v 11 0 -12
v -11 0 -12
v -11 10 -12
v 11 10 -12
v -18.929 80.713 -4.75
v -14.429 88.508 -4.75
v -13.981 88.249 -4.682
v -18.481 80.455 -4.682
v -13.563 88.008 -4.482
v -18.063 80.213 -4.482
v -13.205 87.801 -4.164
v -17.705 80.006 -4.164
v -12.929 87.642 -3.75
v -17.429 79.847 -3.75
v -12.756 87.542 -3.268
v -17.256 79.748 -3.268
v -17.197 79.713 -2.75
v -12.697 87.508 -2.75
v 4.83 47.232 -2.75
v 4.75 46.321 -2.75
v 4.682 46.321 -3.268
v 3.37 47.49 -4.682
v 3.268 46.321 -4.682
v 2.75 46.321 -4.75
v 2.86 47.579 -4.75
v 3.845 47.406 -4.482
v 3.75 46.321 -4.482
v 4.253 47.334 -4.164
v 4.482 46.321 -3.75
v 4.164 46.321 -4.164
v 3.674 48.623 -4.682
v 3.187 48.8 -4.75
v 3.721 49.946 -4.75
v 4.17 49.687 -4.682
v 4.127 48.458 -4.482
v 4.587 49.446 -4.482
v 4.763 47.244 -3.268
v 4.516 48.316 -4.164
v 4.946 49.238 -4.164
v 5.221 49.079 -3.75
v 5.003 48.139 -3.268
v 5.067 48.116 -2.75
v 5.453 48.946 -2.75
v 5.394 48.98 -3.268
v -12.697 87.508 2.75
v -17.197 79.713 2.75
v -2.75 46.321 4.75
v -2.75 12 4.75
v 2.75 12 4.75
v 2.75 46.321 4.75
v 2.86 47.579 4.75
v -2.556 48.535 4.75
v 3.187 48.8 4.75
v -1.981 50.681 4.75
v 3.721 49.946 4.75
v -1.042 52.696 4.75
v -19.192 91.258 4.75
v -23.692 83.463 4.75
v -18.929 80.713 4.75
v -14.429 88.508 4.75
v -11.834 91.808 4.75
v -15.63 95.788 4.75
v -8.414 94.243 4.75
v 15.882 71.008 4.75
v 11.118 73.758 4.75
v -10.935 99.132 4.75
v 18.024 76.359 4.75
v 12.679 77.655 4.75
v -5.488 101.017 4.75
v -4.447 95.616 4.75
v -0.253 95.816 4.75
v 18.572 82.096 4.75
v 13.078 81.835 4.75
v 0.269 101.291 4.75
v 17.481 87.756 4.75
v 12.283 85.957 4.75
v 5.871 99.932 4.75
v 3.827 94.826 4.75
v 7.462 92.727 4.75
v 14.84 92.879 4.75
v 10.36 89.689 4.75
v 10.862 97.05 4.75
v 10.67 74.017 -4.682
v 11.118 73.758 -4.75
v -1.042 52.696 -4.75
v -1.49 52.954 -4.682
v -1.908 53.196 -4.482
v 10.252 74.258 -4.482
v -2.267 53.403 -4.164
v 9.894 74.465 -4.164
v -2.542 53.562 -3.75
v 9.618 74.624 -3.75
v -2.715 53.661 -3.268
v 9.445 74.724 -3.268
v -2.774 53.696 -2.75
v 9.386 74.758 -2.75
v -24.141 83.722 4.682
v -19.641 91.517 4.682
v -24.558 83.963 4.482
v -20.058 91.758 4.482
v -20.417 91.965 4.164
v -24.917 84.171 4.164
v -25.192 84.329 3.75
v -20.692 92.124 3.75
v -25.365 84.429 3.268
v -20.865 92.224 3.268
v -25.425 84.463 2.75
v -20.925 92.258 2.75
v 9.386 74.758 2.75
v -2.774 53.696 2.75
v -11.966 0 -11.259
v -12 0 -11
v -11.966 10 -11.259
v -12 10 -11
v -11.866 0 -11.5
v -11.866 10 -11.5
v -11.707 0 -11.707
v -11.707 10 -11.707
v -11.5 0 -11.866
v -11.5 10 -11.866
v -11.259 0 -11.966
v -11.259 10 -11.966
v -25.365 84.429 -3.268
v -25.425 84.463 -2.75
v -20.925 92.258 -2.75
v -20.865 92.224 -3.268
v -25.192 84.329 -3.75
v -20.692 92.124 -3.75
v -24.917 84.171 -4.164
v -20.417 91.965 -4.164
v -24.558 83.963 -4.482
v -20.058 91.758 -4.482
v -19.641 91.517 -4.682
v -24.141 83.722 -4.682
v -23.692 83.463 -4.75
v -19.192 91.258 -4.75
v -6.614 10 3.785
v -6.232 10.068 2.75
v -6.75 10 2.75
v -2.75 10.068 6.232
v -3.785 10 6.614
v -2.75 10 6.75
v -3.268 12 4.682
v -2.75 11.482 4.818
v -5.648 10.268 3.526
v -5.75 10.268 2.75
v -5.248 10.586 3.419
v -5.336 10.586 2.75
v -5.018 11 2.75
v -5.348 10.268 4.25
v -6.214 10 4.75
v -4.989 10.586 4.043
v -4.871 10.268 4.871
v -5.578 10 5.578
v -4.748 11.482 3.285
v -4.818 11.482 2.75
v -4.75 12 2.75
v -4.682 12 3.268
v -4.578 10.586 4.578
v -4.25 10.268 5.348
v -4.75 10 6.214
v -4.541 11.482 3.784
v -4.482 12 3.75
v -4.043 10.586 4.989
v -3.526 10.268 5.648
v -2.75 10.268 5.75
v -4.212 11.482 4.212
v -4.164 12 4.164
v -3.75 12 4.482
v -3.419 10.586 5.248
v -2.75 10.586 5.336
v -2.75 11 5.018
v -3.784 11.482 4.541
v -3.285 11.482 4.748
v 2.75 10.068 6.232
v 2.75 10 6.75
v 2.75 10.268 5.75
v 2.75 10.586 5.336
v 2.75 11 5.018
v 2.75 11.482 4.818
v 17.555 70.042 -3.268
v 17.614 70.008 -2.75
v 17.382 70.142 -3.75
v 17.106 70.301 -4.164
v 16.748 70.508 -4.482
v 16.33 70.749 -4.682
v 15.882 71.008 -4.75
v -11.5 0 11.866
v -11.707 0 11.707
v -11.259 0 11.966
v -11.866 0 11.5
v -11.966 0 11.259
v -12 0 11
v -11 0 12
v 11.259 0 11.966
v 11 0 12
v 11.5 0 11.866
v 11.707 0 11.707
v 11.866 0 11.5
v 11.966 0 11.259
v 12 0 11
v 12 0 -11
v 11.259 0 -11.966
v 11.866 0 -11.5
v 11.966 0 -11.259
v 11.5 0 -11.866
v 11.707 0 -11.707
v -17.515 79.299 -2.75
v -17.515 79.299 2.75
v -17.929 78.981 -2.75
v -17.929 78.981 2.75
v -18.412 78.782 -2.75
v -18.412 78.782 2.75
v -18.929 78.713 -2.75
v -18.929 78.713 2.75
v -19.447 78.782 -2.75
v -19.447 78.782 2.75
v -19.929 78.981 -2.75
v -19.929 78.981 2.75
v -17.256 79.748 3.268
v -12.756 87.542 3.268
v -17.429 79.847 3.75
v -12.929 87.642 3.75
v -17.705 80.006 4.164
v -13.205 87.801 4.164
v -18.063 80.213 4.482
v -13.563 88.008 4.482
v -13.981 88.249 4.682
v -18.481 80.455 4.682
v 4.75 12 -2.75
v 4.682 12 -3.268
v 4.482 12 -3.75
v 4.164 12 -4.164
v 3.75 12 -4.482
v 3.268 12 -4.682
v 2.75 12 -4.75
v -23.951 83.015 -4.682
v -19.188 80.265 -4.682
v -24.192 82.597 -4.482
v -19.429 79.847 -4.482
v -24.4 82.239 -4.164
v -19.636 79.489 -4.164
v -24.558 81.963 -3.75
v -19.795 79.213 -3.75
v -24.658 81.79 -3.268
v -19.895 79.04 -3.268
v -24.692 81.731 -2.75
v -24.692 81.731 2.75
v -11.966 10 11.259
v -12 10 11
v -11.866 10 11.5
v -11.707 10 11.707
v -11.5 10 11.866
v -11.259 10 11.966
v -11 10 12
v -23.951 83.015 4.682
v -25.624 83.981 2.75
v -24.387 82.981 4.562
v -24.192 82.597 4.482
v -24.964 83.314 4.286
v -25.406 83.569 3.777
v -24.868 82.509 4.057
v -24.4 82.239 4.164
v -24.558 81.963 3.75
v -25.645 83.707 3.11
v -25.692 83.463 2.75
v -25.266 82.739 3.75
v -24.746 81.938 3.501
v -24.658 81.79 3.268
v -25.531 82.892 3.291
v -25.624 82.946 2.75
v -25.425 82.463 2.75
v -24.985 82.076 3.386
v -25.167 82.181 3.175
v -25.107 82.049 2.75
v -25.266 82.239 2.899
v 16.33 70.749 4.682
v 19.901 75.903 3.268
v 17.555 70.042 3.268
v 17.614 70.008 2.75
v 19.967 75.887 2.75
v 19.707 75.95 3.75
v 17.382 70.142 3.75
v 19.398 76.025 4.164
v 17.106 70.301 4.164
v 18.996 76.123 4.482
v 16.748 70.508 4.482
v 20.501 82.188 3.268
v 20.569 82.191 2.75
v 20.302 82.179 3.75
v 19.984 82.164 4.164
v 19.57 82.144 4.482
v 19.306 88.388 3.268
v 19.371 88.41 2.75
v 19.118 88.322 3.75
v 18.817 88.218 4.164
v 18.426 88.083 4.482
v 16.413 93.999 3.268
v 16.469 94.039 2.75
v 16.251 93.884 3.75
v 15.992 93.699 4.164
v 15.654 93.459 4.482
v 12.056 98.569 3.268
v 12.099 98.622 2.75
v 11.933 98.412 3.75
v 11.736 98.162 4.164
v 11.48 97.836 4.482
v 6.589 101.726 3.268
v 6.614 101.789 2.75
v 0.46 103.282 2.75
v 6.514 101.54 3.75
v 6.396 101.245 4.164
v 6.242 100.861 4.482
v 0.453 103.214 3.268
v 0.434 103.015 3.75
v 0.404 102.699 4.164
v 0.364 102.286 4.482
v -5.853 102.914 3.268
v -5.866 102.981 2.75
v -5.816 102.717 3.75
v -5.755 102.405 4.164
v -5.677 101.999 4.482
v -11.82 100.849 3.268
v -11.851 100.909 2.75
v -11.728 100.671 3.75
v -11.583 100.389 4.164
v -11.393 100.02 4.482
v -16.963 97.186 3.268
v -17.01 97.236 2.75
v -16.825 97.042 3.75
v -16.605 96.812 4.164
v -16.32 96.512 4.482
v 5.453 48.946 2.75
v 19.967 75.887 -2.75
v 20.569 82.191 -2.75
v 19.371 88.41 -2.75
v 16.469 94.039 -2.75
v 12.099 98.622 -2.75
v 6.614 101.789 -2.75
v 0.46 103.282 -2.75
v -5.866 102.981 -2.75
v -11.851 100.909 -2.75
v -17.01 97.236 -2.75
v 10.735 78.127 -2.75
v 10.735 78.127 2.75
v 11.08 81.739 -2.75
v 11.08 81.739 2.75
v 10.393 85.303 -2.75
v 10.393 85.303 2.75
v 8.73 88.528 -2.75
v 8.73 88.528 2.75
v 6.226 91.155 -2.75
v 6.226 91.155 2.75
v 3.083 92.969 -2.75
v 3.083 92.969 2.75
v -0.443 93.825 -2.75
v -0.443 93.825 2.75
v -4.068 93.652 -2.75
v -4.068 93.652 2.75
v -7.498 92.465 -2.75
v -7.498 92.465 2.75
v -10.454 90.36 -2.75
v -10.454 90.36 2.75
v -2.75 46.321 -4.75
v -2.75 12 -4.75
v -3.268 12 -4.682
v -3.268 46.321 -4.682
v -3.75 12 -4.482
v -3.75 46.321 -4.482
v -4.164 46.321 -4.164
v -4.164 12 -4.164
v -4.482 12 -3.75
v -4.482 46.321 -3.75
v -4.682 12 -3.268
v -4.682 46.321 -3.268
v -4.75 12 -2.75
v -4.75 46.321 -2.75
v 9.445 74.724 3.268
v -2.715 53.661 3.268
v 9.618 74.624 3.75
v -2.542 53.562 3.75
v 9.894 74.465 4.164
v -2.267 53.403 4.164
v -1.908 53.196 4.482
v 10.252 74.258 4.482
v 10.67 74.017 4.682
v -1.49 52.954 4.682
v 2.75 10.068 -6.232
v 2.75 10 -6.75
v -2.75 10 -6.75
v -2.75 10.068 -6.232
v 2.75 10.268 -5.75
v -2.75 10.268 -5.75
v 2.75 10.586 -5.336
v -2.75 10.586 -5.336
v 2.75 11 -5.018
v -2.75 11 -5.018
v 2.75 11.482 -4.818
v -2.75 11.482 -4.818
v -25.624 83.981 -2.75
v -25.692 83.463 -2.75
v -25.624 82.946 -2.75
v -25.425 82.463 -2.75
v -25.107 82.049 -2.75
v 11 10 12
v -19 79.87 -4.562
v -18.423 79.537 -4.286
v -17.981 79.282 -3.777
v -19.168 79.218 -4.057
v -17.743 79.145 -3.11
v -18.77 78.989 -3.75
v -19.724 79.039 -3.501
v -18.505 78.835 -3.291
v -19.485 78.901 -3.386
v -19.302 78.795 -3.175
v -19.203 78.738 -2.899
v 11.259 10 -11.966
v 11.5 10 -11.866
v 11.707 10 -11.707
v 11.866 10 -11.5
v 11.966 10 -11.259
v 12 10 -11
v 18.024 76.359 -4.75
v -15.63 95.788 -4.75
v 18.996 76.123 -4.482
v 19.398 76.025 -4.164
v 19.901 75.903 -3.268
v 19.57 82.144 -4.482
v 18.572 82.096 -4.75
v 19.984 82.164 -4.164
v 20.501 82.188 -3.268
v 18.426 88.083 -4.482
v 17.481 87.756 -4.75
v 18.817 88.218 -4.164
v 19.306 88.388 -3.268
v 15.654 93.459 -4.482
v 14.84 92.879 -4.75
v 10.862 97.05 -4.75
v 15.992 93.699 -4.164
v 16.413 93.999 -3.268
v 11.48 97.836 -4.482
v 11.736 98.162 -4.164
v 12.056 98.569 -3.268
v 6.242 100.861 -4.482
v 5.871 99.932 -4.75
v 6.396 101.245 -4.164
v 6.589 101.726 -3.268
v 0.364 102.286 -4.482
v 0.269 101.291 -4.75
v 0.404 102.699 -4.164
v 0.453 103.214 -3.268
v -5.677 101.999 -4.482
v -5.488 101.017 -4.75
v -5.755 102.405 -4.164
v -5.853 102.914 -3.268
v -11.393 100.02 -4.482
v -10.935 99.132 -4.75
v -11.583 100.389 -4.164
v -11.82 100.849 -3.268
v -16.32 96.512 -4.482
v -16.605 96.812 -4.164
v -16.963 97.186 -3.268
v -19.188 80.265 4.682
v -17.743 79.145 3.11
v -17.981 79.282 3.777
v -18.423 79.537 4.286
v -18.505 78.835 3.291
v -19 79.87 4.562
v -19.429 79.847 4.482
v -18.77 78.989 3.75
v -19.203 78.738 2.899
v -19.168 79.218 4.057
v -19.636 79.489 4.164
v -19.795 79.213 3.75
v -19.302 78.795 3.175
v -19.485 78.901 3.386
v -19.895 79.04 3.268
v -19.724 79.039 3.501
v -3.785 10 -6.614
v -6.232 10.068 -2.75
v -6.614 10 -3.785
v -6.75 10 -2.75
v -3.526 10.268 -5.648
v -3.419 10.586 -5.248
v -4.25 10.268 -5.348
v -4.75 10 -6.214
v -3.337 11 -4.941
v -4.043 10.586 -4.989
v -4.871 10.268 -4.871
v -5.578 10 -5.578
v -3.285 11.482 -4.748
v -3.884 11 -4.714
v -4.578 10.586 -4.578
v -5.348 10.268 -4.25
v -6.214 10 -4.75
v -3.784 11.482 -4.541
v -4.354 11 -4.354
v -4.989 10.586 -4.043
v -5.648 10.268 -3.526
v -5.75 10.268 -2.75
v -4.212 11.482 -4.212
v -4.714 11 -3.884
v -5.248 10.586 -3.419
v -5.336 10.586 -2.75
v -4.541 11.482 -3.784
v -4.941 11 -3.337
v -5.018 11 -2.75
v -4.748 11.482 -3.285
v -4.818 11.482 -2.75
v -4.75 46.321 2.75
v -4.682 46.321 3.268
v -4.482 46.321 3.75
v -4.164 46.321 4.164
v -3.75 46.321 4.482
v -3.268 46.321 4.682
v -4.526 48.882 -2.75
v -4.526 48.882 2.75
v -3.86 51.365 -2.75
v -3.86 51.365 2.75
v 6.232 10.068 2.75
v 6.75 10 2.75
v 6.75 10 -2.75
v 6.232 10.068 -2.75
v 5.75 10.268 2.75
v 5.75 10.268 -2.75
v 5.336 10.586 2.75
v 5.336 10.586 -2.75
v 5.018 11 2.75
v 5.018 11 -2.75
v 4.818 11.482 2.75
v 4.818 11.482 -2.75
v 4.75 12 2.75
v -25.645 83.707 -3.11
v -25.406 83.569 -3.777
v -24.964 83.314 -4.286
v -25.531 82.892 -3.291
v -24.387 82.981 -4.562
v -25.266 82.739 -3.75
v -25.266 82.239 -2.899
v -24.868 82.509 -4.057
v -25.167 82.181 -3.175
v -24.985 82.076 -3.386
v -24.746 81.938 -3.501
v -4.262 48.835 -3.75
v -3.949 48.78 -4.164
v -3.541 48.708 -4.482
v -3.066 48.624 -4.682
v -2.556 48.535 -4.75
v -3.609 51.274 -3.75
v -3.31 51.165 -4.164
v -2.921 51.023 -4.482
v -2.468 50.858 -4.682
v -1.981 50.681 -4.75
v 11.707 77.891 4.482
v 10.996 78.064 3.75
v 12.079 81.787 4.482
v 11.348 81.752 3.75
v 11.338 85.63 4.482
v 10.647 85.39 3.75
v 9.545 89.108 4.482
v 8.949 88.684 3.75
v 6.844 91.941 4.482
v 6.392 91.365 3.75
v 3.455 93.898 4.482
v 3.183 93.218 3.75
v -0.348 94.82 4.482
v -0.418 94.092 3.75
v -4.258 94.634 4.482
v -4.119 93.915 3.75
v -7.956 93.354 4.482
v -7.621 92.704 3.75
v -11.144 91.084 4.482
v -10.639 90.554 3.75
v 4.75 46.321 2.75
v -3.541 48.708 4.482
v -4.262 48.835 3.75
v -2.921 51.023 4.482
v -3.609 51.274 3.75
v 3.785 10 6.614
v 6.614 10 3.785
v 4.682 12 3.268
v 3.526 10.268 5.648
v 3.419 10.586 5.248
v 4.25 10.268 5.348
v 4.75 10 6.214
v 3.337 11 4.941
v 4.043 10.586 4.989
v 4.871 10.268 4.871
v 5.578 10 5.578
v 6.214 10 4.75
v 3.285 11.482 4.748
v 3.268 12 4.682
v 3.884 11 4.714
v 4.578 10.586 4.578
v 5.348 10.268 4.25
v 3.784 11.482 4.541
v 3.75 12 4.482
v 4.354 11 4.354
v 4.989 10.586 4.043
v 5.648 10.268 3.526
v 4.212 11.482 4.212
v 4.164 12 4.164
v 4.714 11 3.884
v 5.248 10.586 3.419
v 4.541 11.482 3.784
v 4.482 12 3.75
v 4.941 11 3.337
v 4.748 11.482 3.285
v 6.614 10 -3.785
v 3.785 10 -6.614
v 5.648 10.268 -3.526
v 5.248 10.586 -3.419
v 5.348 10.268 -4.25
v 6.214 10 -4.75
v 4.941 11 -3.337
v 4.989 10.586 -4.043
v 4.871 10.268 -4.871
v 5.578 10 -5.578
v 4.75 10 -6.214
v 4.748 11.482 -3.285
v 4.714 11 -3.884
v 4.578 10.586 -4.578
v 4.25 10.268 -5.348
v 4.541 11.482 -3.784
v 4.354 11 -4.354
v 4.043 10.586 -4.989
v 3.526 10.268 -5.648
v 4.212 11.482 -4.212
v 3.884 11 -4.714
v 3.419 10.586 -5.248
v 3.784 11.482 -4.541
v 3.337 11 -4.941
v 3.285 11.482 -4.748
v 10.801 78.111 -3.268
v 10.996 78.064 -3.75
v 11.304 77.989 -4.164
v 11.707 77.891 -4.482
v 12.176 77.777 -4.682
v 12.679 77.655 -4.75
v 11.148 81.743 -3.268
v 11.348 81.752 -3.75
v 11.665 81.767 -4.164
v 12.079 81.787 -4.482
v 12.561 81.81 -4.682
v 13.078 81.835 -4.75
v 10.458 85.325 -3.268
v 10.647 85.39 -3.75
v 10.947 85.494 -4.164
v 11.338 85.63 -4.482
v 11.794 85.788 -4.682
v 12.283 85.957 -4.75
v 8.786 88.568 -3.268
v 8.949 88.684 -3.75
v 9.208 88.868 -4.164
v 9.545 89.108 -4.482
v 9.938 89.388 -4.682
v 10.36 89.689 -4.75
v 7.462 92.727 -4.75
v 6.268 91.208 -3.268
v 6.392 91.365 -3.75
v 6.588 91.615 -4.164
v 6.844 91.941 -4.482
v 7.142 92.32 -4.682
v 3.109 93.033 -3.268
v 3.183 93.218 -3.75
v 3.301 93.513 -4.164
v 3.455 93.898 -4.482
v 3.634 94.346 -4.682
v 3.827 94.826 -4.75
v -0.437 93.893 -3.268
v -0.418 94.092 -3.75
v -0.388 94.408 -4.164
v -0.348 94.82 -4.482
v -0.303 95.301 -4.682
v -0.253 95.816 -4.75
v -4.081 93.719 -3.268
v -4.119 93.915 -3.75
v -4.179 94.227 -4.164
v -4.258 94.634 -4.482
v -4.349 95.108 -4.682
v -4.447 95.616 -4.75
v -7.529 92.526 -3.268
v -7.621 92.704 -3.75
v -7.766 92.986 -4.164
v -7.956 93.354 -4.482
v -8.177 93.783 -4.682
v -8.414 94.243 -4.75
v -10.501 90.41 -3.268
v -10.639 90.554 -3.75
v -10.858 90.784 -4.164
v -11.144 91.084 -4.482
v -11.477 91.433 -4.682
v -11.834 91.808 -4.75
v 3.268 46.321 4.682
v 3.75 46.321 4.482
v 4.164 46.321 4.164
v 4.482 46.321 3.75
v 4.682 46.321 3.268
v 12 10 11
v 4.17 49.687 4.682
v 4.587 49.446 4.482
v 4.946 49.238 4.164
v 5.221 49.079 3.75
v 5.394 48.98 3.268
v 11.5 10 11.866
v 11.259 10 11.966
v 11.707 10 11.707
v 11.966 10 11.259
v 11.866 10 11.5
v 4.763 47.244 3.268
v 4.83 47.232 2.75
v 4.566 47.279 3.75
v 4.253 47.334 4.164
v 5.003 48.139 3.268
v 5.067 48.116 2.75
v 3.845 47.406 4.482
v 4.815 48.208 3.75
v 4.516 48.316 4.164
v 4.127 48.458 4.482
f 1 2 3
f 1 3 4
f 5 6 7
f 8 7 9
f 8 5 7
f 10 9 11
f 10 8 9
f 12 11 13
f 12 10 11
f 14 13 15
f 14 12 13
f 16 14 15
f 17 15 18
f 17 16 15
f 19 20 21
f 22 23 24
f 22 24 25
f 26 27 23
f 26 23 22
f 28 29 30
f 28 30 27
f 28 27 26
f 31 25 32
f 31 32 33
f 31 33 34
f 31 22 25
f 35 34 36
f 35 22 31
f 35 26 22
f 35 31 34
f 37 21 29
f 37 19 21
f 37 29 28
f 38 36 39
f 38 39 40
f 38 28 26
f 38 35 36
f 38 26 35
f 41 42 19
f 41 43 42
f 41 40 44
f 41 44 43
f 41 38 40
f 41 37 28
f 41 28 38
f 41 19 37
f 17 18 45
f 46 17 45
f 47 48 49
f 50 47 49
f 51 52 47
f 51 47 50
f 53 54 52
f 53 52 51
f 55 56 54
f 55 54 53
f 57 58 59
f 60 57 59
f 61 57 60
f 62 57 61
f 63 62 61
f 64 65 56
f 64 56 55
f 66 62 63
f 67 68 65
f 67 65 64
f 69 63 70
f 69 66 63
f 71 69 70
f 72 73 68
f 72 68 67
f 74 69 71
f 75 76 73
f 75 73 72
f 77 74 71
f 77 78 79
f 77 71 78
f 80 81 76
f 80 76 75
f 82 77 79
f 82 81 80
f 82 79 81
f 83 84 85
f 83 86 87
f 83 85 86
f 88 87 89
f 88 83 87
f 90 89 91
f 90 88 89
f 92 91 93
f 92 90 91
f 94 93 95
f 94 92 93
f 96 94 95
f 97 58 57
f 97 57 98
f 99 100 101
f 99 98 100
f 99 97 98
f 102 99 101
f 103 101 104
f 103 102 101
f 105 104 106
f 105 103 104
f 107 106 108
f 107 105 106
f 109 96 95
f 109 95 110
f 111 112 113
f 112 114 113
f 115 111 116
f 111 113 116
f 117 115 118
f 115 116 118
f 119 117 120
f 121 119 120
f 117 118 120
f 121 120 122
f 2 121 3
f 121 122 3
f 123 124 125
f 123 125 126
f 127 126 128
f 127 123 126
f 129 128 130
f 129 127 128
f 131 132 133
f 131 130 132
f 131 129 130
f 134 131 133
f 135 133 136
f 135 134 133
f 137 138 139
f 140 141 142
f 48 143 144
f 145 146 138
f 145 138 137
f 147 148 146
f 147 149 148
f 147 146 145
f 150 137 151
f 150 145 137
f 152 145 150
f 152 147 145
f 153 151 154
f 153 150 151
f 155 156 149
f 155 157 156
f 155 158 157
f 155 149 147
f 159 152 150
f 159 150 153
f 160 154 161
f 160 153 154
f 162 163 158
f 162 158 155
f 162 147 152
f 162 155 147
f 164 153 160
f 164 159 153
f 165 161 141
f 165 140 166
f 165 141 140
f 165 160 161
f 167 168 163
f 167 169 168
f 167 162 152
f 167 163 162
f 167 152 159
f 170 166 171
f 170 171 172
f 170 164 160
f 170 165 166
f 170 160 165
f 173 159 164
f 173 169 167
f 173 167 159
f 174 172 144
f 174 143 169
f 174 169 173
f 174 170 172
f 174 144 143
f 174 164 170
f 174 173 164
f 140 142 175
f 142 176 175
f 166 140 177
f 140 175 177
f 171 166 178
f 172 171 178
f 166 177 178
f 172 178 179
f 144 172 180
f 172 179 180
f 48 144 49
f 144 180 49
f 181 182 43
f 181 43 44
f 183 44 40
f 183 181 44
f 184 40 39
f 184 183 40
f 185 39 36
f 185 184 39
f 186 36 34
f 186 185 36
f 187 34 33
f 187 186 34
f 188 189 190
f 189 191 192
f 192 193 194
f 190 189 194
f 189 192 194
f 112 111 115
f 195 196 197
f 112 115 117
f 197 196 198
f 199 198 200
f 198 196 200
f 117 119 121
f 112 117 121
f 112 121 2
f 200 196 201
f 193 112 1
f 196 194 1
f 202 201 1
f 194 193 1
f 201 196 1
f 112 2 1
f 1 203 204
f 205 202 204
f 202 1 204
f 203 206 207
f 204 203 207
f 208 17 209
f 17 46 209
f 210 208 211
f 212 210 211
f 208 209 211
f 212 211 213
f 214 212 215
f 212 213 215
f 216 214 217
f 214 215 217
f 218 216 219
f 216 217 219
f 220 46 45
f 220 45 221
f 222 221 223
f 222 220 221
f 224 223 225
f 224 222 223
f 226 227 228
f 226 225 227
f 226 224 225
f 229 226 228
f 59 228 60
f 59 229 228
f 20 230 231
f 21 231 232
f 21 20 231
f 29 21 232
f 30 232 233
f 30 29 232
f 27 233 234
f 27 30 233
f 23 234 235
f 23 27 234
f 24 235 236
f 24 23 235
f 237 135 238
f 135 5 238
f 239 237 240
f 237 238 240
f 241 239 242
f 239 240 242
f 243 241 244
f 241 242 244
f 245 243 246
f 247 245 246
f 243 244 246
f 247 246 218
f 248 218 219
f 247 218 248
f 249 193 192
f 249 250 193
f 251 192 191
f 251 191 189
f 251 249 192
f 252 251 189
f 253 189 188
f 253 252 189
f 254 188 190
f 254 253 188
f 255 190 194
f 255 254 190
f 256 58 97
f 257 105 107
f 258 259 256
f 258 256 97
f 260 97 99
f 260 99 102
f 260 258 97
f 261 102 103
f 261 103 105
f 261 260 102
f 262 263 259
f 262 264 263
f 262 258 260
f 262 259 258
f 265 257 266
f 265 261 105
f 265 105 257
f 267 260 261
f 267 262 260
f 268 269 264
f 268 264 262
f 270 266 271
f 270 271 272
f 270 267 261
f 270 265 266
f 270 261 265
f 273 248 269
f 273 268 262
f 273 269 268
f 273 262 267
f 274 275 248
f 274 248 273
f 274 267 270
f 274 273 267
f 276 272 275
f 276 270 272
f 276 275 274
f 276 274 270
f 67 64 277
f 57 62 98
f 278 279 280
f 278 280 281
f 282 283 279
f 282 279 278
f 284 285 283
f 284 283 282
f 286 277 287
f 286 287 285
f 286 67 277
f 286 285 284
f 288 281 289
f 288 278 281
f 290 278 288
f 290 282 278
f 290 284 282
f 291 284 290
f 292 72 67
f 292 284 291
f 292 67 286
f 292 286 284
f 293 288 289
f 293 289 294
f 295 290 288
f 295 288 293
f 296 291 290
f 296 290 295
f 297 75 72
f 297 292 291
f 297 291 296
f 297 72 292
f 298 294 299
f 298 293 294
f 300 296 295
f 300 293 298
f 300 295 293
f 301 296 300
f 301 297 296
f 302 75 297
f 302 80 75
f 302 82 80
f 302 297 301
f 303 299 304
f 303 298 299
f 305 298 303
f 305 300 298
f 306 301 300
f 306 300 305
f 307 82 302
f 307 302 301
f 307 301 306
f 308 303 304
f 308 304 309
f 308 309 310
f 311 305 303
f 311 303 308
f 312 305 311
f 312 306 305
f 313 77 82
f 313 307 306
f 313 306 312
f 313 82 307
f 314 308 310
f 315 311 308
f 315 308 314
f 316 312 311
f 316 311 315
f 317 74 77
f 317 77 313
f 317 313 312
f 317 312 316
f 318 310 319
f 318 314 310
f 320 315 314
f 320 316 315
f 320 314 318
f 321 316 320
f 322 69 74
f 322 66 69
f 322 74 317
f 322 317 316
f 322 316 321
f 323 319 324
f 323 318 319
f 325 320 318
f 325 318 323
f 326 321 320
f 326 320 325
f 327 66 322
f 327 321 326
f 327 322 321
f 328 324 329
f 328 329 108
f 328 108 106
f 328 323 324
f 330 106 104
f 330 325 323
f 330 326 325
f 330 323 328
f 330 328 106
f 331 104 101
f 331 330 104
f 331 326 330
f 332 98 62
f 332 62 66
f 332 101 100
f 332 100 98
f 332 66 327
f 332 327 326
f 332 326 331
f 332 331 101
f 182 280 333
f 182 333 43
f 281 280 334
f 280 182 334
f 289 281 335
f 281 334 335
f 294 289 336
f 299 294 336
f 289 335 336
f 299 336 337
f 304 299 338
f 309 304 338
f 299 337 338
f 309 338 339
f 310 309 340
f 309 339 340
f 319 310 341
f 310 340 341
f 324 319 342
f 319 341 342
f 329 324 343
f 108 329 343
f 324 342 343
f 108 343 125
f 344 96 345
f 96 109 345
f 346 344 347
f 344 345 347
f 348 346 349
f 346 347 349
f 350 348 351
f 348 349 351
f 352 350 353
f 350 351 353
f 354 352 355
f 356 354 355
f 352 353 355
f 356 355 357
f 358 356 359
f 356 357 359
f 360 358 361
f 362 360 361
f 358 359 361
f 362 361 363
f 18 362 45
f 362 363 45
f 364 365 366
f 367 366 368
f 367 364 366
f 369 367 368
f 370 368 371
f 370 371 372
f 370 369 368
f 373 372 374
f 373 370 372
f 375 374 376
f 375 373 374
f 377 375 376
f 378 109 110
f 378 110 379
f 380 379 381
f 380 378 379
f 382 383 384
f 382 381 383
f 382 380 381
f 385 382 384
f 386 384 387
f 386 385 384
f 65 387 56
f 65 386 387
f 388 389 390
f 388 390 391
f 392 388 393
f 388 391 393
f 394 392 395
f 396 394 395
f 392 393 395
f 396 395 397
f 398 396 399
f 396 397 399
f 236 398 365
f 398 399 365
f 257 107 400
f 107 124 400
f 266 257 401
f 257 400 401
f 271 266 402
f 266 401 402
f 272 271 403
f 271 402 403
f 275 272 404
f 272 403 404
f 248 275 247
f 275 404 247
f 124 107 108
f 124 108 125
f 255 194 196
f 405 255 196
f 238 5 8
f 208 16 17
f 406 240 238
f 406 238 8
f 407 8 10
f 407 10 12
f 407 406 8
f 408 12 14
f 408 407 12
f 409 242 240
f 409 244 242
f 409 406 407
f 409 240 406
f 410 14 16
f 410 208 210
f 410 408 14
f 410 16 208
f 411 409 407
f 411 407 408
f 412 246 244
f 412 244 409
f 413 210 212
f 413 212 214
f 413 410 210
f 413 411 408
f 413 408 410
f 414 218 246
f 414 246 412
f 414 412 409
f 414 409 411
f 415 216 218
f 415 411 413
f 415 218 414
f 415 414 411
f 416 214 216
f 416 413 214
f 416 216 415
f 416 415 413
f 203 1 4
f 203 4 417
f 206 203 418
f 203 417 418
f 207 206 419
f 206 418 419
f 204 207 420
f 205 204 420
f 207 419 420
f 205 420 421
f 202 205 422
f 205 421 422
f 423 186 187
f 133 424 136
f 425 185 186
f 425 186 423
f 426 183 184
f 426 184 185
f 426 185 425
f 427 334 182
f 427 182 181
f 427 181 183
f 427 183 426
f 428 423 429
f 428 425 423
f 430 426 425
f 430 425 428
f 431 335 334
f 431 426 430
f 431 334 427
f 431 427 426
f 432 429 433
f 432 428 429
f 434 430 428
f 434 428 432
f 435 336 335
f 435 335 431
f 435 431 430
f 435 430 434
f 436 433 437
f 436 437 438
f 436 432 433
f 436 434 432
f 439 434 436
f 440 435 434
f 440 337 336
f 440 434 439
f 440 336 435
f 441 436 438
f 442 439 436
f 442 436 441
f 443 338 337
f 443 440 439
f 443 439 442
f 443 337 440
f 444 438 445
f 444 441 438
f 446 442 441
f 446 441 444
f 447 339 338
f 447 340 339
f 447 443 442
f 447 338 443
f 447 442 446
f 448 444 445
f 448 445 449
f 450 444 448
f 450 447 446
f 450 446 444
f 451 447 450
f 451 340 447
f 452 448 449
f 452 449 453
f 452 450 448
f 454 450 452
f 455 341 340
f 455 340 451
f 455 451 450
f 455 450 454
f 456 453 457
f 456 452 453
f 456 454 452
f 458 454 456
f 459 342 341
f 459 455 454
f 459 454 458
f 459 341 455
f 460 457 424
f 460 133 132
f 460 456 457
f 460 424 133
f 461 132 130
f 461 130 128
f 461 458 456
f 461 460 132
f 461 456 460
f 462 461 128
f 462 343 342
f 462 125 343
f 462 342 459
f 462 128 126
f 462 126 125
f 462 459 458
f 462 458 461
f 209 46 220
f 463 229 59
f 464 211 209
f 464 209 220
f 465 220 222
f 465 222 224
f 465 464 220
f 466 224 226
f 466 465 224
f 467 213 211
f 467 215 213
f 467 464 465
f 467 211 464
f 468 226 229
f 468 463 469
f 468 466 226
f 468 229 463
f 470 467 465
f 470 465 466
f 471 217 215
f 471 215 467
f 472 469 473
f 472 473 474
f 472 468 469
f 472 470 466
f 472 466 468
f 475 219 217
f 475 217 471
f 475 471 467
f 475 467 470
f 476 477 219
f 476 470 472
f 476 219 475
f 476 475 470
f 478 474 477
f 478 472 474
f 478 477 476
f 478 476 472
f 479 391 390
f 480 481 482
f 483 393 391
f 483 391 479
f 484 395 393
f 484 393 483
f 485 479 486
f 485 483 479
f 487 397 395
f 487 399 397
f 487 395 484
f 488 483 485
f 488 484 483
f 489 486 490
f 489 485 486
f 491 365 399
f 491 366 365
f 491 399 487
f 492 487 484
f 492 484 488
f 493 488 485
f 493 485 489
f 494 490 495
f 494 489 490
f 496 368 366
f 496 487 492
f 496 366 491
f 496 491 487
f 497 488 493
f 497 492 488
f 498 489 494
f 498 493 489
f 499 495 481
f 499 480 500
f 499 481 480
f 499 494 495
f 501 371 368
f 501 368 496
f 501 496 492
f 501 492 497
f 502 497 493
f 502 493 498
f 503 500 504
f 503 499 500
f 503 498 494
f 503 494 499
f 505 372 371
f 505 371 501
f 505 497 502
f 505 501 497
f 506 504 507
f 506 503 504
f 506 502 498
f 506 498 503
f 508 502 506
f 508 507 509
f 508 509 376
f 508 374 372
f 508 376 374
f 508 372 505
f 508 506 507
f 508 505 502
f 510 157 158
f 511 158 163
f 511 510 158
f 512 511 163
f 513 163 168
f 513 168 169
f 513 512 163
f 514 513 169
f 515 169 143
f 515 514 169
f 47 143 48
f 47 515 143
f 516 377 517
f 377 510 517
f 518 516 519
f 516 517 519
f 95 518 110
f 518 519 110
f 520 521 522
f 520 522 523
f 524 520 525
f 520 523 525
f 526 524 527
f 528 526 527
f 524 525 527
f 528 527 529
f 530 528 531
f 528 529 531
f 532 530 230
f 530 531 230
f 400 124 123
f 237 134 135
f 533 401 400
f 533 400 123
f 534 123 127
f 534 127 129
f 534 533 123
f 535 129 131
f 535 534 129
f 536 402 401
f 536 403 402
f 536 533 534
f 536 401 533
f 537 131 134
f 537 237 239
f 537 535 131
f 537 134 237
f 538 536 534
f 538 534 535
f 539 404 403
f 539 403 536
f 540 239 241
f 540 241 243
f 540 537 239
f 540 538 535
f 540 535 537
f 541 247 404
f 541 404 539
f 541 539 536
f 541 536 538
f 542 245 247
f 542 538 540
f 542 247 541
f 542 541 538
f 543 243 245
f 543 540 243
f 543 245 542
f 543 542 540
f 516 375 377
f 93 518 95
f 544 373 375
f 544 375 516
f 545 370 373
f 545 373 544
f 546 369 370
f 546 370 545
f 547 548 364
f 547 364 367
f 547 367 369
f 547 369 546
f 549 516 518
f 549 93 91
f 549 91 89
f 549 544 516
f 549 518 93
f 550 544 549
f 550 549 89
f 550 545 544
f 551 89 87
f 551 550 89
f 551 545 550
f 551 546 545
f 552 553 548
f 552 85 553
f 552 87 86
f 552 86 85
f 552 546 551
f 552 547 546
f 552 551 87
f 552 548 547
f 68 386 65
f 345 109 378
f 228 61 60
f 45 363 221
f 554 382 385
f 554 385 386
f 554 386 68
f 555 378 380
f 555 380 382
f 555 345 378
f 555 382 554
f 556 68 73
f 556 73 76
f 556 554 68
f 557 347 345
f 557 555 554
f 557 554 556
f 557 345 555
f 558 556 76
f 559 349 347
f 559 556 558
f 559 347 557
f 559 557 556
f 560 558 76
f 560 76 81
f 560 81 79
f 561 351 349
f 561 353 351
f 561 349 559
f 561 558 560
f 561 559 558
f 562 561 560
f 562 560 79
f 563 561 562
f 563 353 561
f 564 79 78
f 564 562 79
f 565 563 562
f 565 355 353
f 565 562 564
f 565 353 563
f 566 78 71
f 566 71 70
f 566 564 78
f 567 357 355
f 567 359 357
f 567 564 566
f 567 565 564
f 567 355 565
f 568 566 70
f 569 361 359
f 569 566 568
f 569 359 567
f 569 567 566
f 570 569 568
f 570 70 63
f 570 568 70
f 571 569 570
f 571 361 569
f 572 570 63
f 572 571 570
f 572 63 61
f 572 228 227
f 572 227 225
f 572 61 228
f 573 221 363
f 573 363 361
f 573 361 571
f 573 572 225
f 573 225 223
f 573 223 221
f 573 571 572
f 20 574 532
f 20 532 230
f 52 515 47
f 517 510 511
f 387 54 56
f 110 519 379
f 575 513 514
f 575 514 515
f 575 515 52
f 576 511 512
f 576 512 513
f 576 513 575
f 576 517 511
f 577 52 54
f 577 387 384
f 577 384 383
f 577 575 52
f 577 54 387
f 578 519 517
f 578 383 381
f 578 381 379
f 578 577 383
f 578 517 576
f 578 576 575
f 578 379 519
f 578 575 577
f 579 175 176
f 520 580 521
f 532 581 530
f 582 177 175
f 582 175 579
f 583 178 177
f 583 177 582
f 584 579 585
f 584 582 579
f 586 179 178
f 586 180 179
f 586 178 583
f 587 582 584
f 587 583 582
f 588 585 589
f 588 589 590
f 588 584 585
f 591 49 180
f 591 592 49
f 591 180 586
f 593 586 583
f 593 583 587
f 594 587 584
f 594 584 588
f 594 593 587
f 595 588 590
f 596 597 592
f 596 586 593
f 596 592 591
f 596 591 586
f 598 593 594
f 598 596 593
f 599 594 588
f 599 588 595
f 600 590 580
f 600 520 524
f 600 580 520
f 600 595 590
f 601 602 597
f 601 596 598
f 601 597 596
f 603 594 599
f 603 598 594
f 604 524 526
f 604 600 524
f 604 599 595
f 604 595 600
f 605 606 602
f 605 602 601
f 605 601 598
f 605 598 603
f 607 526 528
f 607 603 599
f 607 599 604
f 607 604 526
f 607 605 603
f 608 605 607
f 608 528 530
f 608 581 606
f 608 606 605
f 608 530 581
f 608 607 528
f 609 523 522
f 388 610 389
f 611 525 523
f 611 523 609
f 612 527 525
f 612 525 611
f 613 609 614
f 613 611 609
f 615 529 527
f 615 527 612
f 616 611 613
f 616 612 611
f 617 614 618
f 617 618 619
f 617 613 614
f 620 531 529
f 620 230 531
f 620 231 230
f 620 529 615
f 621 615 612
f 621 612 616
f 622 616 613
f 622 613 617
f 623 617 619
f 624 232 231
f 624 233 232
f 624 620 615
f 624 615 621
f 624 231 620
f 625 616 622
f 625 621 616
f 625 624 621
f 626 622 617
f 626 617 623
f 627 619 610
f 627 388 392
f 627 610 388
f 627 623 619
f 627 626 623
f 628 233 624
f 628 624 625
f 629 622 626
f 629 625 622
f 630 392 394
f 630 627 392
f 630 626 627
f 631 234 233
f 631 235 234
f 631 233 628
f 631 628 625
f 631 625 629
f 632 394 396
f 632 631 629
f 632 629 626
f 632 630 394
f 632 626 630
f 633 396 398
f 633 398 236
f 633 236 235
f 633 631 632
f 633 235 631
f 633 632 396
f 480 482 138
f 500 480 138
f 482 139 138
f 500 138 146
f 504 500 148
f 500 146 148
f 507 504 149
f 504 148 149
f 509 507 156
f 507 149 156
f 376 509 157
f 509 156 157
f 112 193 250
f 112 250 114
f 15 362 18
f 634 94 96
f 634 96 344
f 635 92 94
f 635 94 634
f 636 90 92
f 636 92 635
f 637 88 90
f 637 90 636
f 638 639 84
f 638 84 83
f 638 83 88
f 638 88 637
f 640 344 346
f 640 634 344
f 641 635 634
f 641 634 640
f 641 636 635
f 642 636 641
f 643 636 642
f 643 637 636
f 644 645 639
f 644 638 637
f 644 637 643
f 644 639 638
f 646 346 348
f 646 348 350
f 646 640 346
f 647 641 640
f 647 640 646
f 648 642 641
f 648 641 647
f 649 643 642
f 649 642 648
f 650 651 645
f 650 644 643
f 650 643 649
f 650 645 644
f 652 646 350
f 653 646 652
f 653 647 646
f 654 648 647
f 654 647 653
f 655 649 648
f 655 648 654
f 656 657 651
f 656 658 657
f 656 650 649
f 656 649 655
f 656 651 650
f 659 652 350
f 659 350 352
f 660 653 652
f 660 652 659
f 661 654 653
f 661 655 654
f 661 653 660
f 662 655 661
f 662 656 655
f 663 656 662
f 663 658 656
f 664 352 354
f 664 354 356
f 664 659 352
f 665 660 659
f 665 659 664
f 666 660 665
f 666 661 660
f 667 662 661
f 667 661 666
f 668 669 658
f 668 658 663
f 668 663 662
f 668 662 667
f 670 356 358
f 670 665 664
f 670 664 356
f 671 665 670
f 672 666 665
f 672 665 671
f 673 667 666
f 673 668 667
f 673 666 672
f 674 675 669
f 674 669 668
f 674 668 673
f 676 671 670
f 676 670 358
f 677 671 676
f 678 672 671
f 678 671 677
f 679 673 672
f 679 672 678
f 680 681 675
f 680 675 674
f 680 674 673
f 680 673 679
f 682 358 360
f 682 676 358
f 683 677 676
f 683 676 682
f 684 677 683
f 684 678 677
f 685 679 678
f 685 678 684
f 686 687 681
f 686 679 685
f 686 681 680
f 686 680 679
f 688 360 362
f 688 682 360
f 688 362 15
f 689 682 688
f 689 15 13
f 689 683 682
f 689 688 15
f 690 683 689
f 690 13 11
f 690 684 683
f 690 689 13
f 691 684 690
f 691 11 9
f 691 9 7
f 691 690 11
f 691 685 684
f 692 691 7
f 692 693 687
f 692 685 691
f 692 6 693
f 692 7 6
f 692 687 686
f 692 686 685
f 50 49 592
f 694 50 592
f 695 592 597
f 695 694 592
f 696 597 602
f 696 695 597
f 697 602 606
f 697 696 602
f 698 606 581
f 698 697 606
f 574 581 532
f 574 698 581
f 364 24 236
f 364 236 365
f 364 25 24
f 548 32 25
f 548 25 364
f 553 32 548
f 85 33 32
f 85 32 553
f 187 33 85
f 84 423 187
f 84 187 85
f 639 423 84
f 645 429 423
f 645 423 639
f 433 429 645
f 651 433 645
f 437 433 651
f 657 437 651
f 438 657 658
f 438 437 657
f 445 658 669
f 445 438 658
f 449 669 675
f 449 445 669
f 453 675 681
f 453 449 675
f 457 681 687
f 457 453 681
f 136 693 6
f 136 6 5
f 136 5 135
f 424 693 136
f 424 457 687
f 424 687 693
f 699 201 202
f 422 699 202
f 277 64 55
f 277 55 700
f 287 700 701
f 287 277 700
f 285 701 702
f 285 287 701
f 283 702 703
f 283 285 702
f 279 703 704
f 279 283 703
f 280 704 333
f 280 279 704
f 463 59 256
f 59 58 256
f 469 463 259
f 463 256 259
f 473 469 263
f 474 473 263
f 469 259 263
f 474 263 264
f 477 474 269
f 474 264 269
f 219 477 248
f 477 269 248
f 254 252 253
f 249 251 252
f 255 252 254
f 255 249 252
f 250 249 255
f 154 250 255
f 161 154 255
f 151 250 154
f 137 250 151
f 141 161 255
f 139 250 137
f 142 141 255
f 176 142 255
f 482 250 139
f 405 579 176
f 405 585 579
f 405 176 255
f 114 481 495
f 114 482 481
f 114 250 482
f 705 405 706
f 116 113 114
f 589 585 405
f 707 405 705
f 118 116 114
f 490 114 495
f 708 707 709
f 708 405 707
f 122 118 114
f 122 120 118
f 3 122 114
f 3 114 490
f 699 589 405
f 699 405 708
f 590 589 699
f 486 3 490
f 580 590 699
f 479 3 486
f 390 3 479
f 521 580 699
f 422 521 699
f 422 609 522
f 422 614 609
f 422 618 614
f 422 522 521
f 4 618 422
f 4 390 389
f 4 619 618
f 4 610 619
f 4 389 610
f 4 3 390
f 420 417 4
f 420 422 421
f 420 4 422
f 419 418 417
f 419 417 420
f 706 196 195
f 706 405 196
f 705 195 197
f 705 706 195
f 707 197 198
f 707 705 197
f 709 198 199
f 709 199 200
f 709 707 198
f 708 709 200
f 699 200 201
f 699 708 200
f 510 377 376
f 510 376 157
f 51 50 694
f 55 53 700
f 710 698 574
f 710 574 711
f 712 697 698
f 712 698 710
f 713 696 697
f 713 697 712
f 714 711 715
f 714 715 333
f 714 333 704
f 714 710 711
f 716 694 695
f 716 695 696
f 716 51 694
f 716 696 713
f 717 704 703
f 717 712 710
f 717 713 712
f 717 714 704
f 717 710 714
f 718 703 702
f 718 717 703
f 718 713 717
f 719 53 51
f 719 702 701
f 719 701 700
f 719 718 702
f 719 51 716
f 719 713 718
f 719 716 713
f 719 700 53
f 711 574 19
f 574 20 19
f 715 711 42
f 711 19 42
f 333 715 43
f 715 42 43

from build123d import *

# Parameters (mm, degrees)
SKETCH1_W           = 24
SKETCH1_H           = 24
BOSS_EXTRUDE1_DEPTH = 10
FILLET1_R           = 2
FILLET2_R           = 1


with BuildPart() as part:
    # Sketch1 → Boss-Extrude1 (new body)
    with BuildSketch(Plane(origin=(0, 0, 0), x_dir=(1, 0, 0), z_dir=(0, 1, 0))):
        Rectangle(SKETCH1_W, SKETCH1_H)
    extrude(amount=BOSS_EXTRUDE1_DEPTH)

    # Sweep1: sweep along a path in Sketch2
    with BuildLine(Plane.XY) as sweep1_path:
        Line((0, 10), (0, 46.32050807568873))
        ThreePointArc((0, 46.32050807568873), (0.3407417371093189, 48.90869852671398), (1.3397459621556382, 51.320508075688814))
        Line((1.3397459621556382, 51.320508075688814), (13.500000000000028, 72.38268590217983))
        ThreePointArc((13.500000000000028, 72.38268590217983), (7.094555433772385, 96.28813046840753), (-16.810889132455312, 89.88268590217987))
        Line((-16.810889132455312, 89.88268590217987), (-22.310889132455326, 80.35640646055106))
    # Sketch3 → Sweep1 (sweep)
    with BuildSketch(Plane(origin=(0, 10, 0), x_dir=(1, 0, 0), z_dir=(0, 1, 0))):
        with BuildLine():
            Line((2.7499999999999853, -4.750000000000002), (-2.749999999999986, -4.750000000000001))
            ThreePointArc((-2.749999999999986, -4.750000000000001), (-4.164213562373095, -4.164213562373096), (-4.75, -2.7499999999999867))
            Line((-4.75, -2.7499999999999867), (-4.75, 2.7499999999999853))
            ThreePointArc((-4.75, 2.7499999999999853), (-4.164213562373094, 4.164213562373095), (-2.7499999999999853, 4.749999999999999))
            Line((-2.7499999999999853, 4.749999999999999), (2.7499999999999862, 4.749999999999998))
            ThreePointArc((2.7499999999999862, 4.749999999999998), (4.164213562373096, 4.164213562373094), (4.750000000000001, 2.749999999999984))
            Line((4.750000000000001, 2.749999999999984), (4.75, -2.749999999999987))
            ThreePointArc((4.75, -2.749999999999987), (4.164213562373096, -4.164213562373097), (2.7499999999999853, -4.750000000000002))
        make_face()
    sweep(path=sweep1_path.line)

    # Fillet1
    fillet1_edges = [part.edges().sort_by_distance(p)[0] for p in [
        (-18.704574400656547, 78.27429967936449, 4.164213562373096),
        (-22.310889132455365, 80.35640646055109, 4.750000000000002),
        (-25.91720386425412, 82.43851324173762, 4.164213562373098),
        (-26.42450980043141, 82.73140646055109, 1.78e-15),
        (-25.917203864254123, 82.43851324173762, -4.164213562373092),
        (-22.310889132455365, 80.35640646055109, -4.749999999999998),
        (-18.704574400656547, 78.27429967936449, -4.164213562373094),
        (-18.197268464479265, 77.98140646055103, 8.9e-16),
        (-4.4e-16, 10, 4.750000000000002),
        (4.164213562373095, 10, 4.164213562373098),
        (4.75, 10, 1.78e-15),
        (4.164213562373097, 10, -4.164213562373092),
        (4.4e-16, 10, -4.749999999999998),
        (-4.164213562373095, 10, -4.164213562373094),
        (-4.75, 10, 8.9e-16),
        (-4.164213562373096, 10, 4.164213562373096),
    ]]
    fillet(fillet1_edges, radius=FILLET1_R)

    # Fillet2
    fillet2_edges = [part.edges().sort_by_distance(p)[0] for p in [
        (12, 5, 12),
        (-12, 5, 12),
        (-12, 5, -12),
        (12, 5, -12),
    ]]
    fillet(fillet2_edges, radius=FILLET2_R)


solid = part.part
